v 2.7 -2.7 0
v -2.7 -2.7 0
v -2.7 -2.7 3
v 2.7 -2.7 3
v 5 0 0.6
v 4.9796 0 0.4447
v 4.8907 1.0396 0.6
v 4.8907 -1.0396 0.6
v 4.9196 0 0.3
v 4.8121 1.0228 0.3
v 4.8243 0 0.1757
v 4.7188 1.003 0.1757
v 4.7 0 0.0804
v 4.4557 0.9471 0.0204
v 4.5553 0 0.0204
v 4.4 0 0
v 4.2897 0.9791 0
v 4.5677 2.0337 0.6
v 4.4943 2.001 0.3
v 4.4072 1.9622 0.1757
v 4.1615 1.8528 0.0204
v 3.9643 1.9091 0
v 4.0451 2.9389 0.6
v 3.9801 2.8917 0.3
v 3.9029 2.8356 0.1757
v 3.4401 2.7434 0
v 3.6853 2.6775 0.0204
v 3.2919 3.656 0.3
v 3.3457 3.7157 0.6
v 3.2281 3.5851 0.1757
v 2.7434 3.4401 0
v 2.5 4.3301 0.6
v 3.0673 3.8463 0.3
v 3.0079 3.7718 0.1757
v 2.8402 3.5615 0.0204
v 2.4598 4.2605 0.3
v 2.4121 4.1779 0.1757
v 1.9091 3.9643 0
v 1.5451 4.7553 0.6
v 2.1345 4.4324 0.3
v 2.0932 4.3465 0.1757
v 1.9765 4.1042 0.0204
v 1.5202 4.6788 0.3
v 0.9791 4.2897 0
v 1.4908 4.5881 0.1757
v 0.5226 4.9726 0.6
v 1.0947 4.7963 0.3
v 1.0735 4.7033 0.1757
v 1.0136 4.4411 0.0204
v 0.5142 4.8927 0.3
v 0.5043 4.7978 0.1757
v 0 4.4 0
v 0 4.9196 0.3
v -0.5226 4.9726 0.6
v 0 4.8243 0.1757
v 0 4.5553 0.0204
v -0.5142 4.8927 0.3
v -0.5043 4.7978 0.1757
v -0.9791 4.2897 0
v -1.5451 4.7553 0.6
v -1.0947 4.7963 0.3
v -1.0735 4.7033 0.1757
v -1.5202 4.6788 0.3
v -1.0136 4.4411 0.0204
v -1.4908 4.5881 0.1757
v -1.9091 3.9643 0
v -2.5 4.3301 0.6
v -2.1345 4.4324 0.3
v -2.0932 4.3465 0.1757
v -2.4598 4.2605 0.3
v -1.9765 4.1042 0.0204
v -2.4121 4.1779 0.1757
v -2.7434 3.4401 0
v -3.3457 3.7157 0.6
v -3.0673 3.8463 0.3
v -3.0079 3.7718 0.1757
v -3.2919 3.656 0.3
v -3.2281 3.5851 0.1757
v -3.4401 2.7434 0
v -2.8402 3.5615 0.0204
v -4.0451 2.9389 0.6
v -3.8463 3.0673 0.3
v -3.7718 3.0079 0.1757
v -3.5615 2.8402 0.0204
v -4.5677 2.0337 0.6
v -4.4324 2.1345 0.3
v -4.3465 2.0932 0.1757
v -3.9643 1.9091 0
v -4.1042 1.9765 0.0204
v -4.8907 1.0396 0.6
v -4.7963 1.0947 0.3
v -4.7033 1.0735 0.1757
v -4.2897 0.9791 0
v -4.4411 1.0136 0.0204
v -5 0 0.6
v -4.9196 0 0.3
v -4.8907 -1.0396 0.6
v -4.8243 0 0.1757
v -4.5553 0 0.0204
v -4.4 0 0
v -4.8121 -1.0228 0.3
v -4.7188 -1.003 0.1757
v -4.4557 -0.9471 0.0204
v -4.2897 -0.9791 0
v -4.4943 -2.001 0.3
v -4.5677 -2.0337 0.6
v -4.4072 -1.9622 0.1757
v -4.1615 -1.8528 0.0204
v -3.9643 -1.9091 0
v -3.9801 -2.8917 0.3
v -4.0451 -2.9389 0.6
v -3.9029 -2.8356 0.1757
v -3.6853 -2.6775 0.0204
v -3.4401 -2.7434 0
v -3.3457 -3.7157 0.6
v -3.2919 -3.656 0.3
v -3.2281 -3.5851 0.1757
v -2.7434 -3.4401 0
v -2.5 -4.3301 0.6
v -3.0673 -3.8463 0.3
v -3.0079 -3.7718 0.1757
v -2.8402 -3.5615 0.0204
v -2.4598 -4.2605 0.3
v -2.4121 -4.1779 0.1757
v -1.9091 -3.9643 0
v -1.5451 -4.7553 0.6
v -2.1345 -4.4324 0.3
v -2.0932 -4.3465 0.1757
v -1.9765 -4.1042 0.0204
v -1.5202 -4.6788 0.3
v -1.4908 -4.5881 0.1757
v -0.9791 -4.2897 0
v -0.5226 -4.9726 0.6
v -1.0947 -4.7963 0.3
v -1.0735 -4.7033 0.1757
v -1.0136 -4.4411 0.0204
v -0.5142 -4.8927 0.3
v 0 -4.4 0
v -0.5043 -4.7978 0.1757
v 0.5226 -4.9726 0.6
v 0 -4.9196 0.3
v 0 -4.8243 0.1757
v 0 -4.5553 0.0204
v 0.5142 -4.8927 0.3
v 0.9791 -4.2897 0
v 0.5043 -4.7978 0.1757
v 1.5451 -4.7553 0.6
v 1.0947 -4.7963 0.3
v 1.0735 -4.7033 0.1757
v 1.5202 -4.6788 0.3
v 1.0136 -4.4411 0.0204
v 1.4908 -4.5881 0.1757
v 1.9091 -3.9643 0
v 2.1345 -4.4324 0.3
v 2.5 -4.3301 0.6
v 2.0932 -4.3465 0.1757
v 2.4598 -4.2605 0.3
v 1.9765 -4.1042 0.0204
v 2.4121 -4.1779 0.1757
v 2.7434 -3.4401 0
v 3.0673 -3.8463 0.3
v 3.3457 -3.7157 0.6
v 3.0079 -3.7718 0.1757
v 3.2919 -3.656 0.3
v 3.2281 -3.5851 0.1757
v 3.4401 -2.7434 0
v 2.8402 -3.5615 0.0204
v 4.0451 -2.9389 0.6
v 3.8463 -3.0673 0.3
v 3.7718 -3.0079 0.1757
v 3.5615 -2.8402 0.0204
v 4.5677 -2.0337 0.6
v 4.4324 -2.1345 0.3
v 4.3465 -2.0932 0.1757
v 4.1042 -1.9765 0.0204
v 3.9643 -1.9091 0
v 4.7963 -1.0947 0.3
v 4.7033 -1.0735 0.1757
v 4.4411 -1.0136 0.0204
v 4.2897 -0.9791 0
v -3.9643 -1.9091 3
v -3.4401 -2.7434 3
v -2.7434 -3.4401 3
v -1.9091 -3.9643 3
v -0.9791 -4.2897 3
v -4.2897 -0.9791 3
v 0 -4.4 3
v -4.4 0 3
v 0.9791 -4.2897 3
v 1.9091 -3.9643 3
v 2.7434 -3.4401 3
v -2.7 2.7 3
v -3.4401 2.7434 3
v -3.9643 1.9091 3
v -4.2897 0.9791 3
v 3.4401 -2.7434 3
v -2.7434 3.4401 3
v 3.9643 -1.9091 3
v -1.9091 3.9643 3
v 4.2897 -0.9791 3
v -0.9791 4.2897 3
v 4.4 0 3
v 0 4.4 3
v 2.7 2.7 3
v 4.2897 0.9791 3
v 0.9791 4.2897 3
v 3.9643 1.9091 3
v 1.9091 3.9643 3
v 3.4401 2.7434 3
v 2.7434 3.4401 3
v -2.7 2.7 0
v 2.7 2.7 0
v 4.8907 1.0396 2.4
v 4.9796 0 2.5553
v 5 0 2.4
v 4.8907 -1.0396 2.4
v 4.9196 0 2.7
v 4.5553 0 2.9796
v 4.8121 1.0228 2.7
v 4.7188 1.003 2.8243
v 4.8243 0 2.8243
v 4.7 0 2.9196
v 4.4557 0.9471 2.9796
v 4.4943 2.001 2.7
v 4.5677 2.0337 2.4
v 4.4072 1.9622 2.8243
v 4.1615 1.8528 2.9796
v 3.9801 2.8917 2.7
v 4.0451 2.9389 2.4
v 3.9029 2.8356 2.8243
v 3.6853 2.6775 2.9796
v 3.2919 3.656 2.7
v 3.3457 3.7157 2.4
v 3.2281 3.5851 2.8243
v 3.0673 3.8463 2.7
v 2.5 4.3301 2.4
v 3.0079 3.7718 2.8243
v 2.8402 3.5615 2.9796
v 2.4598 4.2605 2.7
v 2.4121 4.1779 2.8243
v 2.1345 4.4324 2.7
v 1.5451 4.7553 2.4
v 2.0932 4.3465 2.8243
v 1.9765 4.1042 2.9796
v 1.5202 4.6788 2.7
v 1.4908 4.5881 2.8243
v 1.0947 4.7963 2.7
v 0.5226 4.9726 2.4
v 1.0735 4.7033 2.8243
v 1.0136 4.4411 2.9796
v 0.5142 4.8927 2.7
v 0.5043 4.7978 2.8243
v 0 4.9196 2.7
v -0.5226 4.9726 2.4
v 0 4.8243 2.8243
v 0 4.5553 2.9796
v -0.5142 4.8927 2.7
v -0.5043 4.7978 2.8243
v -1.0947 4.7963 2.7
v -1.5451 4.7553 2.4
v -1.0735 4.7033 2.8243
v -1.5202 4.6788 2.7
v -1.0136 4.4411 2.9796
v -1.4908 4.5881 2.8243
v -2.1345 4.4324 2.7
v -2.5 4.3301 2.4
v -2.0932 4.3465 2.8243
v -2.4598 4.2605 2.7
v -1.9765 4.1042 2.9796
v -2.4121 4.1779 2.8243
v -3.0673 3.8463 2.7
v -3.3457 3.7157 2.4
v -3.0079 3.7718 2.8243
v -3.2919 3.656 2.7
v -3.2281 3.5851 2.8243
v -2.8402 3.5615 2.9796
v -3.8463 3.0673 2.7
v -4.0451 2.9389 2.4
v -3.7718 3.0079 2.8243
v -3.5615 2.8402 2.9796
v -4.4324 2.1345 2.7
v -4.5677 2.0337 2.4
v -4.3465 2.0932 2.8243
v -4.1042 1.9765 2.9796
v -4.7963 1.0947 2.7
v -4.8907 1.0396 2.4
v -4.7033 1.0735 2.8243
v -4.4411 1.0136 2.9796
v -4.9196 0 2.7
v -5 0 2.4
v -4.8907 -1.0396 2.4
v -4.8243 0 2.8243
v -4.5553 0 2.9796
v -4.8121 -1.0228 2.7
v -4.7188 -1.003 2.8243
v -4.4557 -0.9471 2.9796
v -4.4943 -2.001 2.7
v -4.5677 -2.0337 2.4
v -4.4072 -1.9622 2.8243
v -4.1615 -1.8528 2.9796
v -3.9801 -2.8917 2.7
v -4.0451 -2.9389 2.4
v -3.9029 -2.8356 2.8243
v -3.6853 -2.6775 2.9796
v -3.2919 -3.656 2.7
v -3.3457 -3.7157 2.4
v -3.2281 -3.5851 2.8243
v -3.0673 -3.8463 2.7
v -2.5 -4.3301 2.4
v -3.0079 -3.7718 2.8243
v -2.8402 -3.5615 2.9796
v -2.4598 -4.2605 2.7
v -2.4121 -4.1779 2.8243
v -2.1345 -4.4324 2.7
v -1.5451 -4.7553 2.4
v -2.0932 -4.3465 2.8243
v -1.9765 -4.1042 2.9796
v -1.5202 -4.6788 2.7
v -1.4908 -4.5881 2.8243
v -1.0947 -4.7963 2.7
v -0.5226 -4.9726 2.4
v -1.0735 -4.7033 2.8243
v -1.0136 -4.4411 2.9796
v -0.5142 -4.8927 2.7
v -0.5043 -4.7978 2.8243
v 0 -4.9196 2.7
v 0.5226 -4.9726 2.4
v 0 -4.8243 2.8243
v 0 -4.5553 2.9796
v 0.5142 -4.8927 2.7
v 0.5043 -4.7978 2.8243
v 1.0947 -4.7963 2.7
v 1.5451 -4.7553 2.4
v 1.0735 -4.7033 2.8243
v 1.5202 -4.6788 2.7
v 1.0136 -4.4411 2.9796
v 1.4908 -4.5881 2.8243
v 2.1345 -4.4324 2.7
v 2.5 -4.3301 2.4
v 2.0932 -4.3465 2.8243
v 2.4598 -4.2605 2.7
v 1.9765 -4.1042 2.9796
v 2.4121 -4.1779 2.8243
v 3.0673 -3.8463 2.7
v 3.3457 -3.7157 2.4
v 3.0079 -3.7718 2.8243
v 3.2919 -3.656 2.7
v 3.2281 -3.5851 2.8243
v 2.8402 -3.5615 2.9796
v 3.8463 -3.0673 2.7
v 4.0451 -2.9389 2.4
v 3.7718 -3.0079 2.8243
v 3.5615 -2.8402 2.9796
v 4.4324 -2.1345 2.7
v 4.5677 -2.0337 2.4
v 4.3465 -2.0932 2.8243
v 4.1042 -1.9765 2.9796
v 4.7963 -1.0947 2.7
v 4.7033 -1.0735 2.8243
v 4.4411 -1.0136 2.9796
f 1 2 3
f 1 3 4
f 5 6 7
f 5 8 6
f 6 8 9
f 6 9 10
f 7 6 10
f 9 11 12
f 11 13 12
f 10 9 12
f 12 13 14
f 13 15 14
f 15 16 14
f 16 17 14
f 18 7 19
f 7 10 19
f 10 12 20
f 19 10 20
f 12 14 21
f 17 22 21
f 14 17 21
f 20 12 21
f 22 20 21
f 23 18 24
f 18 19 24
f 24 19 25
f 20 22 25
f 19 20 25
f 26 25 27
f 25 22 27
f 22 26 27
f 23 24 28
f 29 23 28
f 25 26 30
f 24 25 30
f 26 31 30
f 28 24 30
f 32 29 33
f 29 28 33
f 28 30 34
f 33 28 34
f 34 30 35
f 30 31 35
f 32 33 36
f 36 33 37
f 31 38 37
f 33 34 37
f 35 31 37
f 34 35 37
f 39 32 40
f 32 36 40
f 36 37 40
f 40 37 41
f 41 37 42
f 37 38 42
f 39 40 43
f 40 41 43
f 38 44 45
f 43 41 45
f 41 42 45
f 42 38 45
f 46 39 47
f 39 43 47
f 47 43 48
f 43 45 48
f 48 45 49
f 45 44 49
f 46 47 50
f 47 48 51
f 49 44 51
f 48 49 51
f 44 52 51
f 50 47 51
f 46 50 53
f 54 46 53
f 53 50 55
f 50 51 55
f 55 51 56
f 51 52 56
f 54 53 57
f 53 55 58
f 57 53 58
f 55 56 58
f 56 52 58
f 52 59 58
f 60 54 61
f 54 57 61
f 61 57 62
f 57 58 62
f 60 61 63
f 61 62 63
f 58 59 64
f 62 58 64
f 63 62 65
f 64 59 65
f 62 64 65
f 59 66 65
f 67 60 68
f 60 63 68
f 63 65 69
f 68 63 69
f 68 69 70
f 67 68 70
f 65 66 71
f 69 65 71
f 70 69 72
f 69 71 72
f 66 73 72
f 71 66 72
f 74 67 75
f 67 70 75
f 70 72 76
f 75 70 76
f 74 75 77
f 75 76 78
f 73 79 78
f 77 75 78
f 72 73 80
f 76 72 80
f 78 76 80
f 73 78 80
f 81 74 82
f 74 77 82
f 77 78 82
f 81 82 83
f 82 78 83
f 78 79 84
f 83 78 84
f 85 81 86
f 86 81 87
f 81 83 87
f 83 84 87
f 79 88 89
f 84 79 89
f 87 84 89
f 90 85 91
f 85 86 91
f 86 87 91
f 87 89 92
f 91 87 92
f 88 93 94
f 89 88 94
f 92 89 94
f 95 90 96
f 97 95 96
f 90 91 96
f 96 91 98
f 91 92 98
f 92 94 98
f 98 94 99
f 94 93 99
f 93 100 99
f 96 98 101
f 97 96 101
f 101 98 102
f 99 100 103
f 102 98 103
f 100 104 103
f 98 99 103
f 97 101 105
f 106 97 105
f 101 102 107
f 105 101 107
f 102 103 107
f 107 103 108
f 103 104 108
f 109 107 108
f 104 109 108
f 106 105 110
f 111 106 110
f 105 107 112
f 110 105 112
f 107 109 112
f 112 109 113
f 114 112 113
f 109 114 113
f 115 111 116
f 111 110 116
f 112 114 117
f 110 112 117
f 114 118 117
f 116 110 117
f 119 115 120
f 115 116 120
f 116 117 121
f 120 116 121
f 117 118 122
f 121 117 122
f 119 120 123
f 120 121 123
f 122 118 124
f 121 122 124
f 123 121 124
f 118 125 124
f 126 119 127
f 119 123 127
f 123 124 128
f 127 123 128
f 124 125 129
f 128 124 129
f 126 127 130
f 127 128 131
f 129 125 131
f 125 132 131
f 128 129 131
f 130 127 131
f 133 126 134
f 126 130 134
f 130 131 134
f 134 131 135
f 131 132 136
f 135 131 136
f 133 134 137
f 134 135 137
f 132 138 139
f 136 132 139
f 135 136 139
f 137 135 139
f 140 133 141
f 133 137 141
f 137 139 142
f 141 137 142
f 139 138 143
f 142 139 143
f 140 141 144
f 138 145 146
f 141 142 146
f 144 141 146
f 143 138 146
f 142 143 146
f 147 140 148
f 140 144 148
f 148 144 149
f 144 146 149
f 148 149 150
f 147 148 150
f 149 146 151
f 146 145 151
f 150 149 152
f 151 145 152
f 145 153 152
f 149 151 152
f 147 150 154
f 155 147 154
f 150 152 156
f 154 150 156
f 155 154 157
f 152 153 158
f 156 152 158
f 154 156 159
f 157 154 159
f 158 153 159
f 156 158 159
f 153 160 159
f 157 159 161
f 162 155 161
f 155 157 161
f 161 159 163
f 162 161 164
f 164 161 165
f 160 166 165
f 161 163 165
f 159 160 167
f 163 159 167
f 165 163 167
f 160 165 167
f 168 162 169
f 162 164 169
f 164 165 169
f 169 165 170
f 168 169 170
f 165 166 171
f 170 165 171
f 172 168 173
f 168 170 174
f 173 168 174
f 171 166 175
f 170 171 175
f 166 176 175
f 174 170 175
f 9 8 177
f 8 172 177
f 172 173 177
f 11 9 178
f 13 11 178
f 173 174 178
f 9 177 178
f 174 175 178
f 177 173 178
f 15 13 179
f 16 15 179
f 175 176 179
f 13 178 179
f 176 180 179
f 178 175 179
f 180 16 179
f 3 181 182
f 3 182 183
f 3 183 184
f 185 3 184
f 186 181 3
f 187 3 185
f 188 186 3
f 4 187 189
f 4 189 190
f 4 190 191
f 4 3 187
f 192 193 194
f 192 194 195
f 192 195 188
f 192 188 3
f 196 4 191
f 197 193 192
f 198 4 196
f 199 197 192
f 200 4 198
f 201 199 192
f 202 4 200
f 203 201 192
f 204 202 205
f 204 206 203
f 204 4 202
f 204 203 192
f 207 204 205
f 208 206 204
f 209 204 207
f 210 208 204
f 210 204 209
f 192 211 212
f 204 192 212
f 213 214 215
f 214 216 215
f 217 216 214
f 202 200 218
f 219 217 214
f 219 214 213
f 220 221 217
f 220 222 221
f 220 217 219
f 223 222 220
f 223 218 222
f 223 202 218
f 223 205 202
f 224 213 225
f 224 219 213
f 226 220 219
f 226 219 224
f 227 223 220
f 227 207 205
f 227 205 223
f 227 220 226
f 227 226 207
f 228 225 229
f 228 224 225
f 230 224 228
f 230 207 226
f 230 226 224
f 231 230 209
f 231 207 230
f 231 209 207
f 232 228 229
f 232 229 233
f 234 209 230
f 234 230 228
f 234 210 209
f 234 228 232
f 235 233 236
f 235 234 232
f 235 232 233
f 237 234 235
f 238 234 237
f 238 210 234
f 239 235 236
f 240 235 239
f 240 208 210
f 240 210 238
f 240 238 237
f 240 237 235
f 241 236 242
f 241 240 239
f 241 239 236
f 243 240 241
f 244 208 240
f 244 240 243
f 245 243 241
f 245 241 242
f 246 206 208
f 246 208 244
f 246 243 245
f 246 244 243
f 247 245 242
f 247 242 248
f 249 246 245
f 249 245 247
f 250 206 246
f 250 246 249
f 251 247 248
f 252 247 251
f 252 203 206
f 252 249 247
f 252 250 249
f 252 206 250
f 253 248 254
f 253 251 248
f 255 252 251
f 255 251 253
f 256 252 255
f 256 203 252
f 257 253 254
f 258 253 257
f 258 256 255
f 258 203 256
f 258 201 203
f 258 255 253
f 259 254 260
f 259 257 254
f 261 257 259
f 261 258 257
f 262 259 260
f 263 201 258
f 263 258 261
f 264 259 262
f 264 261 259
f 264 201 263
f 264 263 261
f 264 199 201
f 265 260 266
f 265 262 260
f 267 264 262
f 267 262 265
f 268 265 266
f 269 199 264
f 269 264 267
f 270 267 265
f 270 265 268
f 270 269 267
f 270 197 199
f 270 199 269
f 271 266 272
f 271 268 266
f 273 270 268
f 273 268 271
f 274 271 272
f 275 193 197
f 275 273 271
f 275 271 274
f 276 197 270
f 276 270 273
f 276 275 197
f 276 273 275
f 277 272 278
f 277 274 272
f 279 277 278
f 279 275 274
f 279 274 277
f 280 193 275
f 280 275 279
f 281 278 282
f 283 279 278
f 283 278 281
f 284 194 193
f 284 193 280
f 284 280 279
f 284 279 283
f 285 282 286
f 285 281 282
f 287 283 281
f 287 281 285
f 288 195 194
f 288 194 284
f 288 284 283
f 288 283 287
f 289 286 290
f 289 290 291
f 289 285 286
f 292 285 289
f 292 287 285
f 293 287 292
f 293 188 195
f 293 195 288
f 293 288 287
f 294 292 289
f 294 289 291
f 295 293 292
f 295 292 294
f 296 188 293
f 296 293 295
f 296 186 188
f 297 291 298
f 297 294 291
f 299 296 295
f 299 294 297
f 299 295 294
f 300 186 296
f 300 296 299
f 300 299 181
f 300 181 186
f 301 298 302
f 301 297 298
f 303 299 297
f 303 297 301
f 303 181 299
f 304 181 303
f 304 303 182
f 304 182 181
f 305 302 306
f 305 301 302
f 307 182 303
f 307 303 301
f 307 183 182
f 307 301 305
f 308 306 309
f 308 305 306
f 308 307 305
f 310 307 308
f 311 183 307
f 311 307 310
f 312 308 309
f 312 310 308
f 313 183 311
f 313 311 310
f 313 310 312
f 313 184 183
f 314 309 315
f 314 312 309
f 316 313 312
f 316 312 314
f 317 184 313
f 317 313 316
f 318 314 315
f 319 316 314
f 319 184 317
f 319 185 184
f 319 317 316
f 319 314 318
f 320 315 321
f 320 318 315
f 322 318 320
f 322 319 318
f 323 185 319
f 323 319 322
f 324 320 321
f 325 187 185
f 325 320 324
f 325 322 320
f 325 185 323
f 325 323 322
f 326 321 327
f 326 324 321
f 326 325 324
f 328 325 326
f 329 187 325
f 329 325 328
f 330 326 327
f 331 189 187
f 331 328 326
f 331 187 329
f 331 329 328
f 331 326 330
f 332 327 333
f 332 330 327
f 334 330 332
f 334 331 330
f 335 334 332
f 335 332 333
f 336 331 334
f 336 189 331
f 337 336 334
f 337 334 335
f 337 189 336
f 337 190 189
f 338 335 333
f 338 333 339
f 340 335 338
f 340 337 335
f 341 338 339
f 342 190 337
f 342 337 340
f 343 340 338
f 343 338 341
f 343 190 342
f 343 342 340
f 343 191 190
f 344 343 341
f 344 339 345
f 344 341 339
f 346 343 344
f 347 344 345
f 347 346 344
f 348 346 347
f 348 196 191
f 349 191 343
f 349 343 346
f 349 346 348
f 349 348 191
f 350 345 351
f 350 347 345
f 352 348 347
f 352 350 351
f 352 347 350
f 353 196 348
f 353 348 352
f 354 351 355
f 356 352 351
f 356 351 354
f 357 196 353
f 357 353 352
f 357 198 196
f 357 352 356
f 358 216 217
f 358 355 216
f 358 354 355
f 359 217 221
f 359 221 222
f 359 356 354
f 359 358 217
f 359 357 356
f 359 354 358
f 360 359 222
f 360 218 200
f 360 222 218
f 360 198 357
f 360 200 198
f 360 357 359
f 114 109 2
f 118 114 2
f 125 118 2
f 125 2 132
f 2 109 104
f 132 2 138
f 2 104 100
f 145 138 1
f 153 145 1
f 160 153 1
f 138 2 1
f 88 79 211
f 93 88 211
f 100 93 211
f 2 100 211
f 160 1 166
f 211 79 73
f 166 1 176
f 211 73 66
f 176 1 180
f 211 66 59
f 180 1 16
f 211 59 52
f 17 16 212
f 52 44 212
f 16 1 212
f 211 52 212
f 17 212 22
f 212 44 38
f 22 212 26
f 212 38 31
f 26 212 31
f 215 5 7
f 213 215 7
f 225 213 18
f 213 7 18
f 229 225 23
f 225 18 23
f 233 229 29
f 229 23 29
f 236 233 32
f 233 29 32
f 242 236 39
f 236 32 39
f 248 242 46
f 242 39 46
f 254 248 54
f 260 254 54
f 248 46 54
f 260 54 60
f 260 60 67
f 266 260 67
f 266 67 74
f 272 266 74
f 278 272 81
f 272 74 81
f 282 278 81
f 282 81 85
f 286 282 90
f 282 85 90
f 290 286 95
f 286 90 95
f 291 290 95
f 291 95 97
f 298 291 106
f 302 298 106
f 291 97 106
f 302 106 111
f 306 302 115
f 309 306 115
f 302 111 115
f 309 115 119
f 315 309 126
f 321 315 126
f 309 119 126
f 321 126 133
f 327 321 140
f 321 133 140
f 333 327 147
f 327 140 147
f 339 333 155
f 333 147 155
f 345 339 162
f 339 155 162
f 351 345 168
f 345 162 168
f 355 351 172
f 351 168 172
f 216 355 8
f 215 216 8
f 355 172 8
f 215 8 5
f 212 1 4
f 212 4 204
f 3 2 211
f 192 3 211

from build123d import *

# Parameters (mm, degrees)
F0_R     = 5
F0_W     = 5.4
F0_H     = 5.4
F1_DEPTH = 3
F2_R     = 0.6


with BuildPart() as f1:
    # F0 (on Top) → F1 (new body)
    with BuildSketch(Plane.XY):
        Circle(F0_R)
        Rectangle(F0_W, F0_H, mode=Mode.SUBTRACT)
    extrude(amount=F1_DEPTH)

    # F2
    f2_edges = [f1.edges().sort_by_distance(p)[0] for p in [
        (5, 0, 1.5),
        (-5, 0, 0),
        (-5, 0, 3),
    ]]
    fillet(f2_edges, radius=F2_R)


solid = f1.part
